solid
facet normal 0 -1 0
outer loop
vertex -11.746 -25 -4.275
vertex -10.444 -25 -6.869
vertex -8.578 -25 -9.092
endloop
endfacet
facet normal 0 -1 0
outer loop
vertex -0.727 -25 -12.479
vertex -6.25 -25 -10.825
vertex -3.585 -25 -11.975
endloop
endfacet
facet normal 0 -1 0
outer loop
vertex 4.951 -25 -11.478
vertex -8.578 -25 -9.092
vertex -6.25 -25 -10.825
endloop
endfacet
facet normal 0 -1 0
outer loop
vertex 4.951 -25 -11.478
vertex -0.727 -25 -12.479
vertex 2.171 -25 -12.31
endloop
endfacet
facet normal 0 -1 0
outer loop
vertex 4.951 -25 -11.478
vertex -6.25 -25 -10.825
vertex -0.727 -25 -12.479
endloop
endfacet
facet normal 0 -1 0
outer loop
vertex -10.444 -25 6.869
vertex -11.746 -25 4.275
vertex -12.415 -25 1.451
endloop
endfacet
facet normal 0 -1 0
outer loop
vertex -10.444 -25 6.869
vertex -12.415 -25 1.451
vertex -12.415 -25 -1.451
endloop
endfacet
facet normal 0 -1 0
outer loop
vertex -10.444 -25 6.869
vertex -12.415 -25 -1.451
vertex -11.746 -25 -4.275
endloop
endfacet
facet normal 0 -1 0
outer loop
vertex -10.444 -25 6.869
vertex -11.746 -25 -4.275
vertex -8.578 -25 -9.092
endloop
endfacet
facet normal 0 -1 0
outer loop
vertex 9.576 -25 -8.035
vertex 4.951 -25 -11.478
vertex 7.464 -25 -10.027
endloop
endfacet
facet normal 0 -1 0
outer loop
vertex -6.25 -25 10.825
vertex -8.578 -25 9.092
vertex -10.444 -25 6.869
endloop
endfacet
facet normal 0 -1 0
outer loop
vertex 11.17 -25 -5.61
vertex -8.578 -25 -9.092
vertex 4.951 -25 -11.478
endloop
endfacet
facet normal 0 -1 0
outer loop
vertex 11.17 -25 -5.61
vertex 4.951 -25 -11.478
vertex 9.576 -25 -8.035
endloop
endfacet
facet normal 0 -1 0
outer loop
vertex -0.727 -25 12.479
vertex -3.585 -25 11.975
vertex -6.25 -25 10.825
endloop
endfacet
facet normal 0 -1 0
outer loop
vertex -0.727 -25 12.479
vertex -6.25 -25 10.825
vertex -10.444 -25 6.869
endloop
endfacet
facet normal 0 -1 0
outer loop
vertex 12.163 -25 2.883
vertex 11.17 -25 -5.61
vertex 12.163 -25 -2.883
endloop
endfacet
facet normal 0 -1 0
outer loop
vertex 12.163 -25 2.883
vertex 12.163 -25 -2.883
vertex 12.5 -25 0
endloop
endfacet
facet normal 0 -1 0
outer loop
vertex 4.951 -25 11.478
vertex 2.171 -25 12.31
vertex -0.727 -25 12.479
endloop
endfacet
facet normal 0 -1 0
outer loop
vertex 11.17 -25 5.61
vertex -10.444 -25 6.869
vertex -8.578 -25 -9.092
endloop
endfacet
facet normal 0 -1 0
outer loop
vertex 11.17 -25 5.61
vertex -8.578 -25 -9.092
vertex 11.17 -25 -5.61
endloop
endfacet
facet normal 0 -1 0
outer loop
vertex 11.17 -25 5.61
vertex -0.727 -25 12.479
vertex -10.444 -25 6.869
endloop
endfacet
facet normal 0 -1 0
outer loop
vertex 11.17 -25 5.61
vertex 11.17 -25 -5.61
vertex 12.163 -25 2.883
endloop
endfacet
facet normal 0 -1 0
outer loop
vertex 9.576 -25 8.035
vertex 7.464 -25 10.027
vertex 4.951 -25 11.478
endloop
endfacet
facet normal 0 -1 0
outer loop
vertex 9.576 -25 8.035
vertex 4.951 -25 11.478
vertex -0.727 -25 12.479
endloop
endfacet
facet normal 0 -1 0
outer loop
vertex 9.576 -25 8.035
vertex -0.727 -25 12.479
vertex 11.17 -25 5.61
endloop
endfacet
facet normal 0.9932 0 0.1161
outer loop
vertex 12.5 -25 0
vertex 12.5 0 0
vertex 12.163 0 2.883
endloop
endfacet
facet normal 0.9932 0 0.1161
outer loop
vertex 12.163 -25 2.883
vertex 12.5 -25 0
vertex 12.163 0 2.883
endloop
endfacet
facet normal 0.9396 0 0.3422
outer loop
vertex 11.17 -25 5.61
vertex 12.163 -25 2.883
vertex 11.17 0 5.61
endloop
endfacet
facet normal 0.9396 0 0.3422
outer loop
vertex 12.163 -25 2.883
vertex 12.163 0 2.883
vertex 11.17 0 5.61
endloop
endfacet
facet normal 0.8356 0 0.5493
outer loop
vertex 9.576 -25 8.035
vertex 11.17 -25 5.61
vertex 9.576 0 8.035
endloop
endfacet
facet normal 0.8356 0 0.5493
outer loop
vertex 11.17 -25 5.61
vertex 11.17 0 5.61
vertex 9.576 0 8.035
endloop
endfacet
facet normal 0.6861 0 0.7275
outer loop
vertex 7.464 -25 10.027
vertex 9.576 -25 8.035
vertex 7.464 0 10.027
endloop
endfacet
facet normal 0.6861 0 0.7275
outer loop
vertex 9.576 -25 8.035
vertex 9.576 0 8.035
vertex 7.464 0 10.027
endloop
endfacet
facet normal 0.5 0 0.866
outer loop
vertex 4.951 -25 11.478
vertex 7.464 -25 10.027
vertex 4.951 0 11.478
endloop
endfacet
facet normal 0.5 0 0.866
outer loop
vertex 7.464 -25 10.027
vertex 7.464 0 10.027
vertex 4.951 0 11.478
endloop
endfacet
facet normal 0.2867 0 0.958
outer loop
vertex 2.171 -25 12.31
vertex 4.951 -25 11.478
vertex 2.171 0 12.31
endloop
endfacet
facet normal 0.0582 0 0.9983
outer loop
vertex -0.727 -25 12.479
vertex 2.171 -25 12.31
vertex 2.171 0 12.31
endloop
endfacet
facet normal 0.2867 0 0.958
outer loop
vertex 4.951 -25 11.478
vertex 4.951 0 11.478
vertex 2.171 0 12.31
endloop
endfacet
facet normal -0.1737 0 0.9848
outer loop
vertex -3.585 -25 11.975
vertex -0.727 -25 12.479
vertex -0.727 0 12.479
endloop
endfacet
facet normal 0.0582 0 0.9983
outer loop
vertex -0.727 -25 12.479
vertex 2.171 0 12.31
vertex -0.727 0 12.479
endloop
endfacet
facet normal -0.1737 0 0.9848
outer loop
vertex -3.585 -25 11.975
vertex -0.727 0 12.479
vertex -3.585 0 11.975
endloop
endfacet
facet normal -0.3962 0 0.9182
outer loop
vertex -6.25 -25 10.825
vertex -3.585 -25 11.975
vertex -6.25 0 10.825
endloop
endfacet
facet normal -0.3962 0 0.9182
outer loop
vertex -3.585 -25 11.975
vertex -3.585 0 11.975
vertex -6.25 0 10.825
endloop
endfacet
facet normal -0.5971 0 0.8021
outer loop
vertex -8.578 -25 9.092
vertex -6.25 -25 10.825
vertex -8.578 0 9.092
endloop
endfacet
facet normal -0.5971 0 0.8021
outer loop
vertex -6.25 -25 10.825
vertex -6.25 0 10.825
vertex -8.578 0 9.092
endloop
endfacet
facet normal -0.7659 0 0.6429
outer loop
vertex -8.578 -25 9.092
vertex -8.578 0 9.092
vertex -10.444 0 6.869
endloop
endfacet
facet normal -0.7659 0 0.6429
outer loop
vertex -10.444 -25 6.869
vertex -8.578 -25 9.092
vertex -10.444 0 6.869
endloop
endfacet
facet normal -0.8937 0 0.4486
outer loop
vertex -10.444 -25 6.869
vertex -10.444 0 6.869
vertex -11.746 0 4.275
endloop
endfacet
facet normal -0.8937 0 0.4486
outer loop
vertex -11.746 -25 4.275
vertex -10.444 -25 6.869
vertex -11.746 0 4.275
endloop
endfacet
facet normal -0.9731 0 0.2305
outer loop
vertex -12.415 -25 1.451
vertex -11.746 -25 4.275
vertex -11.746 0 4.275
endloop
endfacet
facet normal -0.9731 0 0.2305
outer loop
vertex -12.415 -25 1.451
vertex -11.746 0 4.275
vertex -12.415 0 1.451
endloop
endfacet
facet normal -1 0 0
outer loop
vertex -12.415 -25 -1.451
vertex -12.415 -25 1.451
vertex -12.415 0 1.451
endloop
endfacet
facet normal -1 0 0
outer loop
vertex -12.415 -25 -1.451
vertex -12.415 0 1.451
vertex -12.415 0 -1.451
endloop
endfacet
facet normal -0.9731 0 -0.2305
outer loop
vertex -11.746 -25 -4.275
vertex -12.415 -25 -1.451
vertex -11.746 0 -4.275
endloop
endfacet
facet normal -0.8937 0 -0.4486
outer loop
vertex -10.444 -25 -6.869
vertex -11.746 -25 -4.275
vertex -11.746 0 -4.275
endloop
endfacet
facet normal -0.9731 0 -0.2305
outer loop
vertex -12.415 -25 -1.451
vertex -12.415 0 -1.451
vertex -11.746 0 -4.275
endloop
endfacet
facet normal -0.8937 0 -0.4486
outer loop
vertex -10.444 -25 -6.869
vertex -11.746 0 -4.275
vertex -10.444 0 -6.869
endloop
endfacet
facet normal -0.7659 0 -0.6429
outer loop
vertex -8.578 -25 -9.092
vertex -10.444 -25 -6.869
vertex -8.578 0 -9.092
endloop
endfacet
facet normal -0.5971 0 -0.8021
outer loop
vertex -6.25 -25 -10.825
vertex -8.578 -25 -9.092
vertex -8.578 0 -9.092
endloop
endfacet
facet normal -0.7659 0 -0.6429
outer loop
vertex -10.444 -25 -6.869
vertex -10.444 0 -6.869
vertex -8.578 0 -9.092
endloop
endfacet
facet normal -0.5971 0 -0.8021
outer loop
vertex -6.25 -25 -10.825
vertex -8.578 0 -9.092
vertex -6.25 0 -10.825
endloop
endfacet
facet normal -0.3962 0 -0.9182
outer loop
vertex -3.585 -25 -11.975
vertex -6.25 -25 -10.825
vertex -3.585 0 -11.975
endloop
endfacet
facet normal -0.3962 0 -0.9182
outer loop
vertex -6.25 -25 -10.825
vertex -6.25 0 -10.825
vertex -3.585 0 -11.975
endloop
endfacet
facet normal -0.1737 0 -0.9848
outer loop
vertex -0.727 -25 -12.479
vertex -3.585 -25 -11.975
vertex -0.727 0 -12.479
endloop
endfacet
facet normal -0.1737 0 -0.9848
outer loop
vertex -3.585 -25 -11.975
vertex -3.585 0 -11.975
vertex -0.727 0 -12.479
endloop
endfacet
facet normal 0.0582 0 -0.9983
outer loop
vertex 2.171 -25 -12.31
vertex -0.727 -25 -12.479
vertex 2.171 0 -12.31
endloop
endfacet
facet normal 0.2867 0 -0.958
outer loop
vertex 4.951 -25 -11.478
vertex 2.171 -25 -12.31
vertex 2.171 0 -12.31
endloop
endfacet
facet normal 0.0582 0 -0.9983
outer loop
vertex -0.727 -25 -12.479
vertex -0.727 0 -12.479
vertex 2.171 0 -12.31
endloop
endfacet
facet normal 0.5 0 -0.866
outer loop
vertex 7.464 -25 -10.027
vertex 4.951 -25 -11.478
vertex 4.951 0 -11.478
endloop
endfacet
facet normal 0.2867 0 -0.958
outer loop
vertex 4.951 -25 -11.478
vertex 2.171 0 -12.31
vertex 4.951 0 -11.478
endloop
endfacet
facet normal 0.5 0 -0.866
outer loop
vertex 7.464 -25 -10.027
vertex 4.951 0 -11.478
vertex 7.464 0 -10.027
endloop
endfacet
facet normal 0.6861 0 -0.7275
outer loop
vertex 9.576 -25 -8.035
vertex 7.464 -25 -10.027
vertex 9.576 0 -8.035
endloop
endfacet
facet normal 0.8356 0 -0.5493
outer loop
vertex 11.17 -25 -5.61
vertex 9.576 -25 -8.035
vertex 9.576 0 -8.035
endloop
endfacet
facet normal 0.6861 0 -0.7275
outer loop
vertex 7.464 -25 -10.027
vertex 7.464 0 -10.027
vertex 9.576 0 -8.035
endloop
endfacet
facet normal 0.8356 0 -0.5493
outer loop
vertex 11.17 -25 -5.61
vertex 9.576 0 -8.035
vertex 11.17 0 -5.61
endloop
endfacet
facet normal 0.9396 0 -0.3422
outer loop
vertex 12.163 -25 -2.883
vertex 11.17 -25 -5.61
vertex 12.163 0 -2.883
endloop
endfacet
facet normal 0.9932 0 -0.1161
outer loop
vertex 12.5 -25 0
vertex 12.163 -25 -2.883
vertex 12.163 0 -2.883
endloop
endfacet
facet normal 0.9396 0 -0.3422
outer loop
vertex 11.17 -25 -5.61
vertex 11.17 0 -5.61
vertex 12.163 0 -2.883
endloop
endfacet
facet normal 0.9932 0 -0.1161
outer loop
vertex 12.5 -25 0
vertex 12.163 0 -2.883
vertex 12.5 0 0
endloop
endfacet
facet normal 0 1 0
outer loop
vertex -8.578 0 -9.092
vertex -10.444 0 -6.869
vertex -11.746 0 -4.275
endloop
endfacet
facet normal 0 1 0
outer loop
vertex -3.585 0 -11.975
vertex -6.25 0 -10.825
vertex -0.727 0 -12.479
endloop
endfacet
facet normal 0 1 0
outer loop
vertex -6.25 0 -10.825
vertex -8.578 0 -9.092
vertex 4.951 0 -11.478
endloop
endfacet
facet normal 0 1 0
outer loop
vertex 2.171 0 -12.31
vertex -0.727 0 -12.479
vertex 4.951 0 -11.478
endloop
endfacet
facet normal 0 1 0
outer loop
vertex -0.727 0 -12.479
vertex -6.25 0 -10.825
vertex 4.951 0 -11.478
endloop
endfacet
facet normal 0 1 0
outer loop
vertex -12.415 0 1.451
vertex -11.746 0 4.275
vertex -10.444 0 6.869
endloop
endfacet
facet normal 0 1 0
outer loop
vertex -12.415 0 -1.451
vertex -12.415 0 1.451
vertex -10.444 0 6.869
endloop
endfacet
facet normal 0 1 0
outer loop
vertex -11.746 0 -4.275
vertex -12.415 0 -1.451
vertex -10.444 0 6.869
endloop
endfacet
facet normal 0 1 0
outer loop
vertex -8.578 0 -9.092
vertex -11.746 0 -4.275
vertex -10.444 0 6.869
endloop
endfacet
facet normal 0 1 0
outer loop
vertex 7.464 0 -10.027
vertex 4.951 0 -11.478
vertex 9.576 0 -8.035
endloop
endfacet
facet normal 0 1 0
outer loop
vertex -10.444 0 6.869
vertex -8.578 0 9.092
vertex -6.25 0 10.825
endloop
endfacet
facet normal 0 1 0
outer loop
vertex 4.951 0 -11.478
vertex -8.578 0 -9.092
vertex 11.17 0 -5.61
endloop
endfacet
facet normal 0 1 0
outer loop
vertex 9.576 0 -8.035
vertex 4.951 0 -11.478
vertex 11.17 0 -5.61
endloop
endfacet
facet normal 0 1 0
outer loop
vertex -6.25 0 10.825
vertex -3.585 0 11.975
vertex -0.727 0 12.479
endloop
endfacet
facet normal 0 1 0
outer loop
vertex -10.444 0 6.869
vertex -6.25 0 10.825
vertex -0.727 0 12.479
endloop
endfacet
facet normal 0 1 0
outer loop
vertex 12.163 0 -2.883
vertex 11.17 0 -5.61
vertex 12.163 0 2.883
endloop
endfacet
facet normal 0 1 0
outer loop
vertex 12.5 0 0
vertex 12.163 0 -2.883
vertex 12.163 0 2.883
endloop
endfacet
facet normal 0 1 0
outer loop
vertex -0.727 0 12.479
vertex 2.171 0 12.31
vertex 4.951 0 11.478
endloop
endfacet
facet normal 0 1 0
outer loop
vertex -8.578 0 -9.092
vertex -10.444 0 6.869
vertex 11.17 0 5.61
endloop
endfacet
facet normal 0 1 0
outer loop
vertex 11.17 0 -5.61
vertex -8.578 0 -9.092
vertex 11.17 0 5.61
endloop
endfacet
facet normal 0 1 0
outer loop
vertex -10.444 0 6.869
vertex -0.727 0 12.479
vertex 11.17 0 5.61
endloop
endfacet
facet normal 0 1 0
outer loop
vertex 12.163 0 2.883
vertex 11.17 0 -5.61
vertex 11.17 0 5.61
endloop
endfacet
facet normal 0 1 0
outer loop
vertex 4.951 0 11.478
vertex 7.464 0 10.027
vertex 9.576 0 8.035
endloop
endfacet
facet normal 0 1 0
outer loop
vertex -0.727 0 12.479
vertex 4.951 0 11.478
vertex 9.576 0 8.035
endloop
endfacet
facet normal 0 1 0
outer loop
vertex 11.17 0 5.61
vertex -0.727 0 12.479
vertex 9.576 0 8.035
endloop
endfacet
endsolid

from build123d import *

# Parameters (mm, degrees)
F0_R     = 12.5
F1_DEPTH = 25
F0_R_2   = 10


with BuildPart() as f1:
    # F0 (on Front) → F1 (new body)
    with BuildSketch(Plane.XZ):
        Circle(F0_R)
    extrude(amount=F1_DEPTH)


with BuildPart() as f1b:
    # F0 (on Front) → F1, piece 2 (new body)
    with BuildSketch(Plane.XZ):
        with Locations((0, 40)):
            Circle(F0_R_2)
    extrude(amount=F1_DEPTH)


solid = f1.part
